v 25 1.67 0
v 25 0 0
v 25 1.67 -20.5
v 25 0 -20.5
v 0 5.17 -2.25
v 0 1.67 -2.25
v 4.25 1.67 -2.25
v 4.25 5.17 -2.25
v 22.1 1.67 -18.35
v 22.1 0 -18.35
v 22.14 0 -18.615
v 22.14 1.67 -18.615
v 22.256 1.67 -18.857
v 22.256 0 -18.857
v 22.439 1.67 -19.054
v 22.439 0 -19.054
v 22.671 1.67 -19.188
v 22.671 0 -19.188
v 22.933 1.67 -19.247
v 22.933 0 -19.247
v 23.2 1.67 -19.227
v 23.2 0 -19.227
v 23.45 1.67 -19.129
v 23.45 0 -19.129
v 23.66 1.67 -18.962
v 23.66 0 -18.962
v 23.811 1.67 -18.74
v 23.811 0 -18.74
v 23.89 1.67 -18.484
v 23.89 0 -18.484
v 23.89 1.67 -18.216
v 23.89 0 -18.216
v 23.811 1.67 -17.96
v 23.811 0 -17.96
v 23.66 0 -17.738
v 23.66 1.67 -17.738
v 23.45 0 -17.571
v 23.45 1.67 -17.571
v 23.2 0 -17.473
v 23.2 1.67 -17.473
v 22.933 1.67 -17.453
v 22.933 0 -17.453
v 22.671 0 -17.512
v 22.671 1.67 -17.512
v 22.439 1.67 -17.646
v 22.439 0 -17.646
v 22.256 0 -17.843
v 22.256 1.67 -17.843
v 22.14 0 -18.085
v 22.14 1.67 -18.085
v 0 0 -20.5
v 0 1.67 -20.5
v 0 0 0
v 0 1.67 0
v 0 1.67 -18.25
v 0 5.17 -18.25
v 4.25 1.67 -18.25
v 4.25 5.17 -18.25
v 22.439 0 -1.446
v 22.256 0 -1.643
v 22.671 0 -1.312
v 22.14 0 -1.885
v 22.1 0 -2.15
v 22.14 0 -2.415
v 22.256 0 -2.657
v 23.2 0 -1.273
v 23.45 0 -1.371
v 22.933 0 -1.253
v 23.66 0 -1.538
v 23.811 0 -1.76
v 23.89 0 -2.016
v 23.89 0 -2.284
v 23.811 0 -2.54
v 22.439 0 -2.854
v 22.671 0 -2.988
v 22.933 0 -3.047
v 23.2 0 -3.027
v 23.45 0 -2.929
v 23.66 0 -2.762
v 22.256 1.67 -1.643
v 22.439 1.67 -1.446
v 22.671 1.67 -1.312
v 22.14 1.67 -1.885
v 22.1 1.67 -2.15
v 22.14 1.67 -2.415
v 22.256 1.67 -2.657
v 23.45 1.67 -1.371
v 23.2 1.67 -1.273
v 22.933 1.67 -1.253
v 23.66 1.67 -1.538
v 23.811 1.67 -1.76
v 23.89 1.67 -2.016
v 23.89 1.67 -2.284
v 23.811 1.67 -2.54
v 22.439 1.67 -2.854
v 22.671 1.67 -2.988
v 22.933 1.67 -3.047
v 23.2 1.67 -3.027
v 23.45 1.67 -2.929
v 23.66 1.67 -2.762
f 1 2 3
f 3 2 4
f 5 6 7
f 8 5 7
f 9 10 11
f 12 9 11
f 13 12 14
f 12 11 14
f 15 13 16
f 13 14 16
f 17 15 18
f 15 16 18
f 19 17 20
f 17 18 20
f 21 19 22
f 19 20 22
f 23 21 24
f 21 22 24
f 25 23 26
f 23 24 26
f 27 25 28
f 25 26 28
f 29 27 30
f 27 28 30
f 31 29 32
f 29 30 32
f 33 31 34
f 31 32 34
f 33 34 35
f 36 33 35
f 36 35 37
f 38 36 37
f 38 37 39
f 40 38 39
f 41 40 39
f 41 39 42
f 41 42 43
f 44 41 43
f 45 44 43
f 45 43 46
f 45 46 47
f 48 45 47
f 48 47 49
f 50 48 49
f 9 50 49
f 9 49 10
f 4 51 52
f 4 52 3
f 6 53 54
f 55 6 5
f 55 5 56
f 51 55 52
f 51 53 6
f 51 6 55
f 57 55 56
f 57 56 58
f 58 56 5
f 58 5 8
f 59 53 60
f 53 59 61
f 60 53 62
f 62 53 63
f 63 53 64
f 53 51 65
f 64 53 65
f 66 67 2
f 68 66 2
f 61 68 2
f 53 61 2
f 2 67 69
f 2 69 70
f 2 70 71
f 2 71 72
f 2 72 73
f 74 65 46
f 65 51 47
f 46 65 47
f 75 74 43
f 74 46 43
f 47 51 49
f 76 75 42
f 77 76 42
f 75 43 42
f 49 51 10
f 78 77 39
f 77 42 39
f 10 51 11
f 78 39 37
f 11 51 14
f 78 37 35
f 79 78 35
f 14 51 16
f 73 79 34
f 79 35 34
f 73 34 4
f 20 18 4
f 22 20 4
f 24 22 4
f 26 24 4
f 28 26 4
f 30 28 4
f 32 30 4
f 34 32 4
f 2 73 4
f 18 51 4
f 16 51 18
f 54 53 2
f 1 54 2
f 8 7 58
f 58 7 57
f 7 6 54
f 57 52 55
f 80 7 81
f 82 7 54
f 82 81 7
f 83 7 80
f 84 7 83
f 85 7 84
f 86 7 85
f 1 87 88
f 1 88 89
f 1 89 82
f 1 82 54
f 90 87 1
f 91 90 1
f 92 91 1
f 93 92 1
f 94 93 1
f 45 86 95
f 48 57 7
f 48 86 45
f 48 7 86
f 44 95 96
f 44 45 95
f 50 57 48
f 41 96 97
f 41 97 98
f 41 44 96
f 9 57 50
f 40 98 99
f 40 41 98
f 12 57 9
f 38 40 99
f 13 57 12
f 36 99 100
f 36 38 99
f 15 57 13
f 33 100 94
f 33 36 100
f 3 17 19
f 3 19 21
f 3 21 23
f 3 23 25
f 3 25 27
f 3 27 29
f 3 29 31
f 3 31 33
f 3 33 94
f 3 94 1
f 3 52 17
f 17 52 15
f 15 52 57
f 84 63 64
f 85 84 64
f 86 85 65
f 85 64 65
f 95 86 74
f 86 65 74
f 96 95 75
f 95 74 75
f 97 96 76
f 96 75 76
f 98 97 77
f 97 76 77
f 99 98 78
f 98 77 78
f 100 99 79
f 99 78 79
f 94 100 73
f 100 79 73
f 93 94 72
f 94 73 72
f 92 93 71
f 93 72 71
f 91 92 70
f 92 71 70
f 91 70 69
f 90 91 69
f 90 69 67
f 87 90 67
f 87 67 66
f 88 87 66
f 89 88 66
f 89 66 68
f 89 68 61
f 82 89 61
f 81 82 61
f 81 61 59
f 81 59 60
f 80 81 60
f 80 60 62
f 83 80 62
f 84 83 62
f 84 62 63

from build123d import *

# Parameters (mm, degrees)
SKETCH1_W              = 25
SKETCH1_H              = 20.5
BOSS_EXTRUDE1_DEPTH    = 1.67
M1_6_CLEARANCE_HOLE1_D = 1.8
SKETCH4_W              = 4.25
SKETCH4_H              = 16
BOSS_EXTRUDE2_DEPTH    = 3.5


with BuildPart() as part:
    # Sketch1 → Boss-Extrude1 (new body)
    with BuildSketch(Plane(origin=(0, 0, 0), x_dir=(1, 0, 0), z_dir=(0, 1, 0))):
        with Locations((12.5, 10.25)):
            Rectangle(SKETCH1_W, SKETCH1_H)
    extrude(amount=BOSS_EXTRUDE1_DEPTH)

    # M1.6 Clearance Hole1 (through all)
    with Locations(Plane(origin=(0, 1.67, 0), x_dir=(1, 0, 0), z_dir=(0, 1, 0))):
        with Locations((23, 18.35), (23, 2.15)):
            Hole(M1_6_CLEARANCE_HOLE1_D / 2)

    # Sketch4 → Boss-Extrude2 (add)
    with BuildSketch(Plane(origin=(0, 1.67, 0), x_dir=(1, 0, 0), z_dir=(0, 1, 0))):
        with Locations((2.125, 10.25)):
            Rectangle(SKETCH4_W, SKETCH4_H)
    extrude(amount=BOSS_EXTRUDE2_DEPTH)


solid = part.part
